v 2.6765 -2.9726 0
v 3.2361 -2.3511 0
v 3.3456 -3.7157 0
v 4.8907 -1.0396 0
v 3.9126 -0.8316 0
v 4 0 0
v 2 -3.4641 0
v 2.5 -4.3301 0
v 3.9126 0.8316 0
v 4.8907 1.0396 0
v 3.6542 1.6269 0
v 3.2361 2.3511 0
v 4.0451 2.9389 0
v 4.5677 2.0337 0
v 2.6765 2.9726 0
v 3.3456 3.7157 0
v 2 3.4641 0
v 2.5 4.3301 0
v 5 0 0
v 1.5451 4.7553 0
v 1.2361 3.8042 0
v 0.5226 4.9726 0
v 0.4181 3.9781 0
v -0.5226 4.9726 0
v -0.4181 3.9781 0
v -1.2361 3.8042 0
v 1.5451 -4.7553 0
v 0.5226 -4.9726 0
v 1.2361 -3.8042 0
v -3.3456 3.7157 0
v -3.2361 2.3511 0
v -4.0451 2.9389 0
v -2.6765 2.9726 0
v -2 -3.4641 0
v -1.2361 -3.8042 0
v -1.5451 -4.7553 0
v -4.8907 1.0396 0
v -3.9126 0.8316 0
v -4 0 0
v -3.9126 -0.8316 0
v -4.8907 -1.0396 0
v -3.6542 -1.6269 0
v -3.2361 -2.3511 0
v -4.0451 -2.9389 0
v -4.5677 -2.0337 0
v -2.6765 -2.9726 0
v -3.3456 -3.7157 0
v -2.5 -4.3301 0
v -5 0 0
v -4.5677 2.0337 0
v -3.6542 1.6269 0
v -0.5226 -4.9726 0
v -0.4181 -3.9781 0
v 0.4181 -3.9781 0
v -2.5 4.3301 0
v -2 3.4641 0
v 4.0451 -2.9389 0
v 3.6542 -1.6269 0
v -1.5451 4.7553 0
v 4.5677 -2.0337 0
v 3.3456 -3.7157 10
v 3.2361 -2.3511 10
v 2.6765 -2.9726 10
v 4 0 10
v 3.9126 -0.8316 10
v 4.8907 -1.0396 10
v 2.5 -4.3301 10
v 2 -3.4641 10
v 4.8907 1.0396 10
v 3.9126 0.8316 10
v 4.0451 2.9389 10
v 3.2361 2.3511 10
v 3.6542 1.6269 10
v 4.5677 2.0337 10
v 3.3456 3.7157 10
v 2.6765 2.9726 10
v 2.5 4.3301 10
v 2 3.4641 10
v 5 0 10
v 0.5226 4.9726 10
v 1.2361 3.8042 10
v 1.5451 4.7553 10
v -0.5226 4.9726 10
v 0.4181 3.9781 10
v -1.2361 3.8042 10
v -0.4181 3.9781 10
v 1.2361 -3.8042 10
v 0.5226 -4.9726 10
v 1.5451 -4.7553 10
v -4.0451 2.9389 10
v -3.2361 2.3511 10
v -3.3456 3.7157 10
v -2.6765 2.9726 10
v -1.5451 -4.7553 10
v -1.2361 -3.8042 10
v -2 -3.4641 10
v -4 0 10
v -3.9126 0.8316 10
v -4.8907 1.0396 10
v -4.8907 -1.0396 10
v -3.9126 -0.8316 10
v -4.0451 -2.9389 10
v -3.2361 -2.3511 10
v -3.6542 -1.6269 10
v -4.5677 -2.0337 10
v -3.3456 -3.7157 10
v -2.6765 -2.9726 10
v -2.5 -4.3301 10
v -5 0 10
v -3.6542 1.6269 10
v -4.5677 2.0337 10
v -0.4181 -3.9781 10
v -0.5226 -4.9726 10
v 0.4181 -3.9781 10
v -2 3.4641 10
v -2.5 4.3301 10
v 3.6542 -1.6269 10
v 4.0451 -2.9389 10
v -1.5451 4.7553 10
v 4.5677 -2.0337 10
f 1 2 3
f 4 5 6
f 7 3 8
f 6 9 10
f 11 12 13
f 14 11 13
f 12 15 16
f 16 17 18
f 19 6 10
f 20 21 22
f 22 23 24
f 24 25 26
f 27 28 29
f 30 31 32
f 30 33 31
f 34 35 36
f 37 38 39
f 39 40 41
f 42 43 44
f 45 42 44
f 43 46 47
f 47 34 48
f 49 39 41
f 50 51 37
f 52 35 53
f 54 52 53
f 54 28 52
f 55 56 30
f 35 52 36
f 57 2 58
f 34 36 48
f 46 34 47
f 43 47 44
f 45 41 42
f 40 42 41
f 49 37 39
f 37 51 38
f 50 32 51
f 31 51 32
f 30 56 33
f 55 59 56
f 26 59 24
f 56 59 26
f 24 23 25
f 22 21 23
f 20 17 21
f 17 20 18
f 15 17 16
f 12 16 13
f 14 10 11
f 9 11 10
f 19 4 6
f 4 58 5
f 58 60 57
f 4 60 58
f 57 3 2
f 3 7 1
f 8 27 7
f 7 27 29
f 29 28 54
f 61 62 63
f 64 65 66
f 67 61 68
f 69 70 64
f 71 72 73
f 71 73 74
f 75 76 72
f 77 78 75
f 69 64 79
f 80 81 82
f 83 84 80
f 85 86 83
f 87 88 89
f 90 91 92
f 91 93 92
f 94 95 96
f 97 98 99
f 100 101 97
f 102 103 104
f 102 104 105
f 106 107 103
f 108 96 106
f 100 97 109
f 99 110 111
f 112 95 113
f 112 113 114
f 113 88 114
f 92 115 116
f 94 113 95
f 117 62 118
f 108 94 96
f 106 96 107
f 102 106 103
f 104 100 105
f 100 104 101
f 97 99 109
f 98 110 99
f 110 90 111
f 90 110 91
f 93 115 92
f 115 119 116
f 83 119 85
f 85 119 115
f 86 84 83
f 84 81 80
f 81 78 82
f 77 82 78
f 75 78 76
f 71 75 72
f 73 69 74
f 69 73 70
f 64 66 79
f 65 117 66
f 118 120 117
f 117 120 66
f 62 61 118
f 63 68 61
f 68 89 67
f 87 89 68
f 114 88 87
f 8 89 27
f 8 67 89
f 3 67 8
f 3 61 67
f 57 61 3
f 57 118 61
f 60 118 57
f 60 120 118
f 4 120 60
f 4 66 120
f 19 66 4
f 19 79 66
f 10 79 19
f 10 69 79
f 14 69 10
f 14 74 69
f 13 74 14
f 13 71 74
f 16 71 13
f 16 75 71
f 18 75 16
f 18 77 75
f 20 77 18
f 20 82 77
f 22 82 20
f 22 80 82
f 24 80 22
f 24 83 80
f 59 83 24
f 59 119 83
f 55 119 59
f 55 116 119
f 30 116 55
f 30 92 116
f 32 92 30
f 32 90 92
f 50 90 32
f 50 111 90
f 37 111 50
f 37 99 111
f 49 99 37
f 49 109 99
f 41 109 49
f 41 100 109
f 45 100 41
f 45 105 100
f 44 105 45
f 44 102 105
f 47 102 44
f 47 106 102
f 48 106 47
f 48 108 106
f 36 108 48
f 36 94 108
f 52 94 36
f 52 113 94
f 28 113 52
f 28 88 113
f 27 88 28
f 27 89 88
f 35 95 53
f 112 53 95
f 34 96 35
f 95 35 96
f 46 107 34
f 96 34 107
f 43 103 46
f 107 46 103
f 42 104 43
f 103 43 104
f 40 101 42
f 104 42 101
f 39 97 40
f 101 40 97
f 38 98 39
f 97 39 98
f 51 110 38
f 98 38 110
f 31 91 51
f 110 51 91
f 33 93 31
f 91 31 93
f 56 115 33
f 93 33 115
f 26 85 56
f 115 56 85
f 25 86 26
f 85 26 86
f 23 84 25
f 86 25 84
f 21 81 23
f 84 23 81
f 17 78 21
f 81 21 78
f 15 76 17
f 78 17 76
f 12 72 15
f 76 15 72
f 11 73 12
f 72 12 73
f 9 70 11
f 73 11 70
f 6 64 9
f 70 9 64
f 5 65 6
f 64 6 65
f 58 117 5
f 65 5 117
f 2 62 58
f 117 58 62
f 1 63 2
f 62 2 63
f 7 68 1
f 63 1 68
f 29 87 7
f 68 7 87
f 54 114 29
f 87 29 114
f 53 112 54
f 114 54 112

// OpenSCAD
// Nicolì Angelo 2023 - THIS CODE IS LICENSED AS GPL-2.0

Pipe_Lenght = 10;
Pipe_Dext = 10;
Pipe_Dint = 8;

linear_extrude(Pipe_Lenght, $fn = $preview? 90: 30) 

difference(){
circle(d = Pipe_Dext, $fn = $preview? 90: 30);
circle(d = Pipe_Dint, $fn = $preview? 90: 30);
}
